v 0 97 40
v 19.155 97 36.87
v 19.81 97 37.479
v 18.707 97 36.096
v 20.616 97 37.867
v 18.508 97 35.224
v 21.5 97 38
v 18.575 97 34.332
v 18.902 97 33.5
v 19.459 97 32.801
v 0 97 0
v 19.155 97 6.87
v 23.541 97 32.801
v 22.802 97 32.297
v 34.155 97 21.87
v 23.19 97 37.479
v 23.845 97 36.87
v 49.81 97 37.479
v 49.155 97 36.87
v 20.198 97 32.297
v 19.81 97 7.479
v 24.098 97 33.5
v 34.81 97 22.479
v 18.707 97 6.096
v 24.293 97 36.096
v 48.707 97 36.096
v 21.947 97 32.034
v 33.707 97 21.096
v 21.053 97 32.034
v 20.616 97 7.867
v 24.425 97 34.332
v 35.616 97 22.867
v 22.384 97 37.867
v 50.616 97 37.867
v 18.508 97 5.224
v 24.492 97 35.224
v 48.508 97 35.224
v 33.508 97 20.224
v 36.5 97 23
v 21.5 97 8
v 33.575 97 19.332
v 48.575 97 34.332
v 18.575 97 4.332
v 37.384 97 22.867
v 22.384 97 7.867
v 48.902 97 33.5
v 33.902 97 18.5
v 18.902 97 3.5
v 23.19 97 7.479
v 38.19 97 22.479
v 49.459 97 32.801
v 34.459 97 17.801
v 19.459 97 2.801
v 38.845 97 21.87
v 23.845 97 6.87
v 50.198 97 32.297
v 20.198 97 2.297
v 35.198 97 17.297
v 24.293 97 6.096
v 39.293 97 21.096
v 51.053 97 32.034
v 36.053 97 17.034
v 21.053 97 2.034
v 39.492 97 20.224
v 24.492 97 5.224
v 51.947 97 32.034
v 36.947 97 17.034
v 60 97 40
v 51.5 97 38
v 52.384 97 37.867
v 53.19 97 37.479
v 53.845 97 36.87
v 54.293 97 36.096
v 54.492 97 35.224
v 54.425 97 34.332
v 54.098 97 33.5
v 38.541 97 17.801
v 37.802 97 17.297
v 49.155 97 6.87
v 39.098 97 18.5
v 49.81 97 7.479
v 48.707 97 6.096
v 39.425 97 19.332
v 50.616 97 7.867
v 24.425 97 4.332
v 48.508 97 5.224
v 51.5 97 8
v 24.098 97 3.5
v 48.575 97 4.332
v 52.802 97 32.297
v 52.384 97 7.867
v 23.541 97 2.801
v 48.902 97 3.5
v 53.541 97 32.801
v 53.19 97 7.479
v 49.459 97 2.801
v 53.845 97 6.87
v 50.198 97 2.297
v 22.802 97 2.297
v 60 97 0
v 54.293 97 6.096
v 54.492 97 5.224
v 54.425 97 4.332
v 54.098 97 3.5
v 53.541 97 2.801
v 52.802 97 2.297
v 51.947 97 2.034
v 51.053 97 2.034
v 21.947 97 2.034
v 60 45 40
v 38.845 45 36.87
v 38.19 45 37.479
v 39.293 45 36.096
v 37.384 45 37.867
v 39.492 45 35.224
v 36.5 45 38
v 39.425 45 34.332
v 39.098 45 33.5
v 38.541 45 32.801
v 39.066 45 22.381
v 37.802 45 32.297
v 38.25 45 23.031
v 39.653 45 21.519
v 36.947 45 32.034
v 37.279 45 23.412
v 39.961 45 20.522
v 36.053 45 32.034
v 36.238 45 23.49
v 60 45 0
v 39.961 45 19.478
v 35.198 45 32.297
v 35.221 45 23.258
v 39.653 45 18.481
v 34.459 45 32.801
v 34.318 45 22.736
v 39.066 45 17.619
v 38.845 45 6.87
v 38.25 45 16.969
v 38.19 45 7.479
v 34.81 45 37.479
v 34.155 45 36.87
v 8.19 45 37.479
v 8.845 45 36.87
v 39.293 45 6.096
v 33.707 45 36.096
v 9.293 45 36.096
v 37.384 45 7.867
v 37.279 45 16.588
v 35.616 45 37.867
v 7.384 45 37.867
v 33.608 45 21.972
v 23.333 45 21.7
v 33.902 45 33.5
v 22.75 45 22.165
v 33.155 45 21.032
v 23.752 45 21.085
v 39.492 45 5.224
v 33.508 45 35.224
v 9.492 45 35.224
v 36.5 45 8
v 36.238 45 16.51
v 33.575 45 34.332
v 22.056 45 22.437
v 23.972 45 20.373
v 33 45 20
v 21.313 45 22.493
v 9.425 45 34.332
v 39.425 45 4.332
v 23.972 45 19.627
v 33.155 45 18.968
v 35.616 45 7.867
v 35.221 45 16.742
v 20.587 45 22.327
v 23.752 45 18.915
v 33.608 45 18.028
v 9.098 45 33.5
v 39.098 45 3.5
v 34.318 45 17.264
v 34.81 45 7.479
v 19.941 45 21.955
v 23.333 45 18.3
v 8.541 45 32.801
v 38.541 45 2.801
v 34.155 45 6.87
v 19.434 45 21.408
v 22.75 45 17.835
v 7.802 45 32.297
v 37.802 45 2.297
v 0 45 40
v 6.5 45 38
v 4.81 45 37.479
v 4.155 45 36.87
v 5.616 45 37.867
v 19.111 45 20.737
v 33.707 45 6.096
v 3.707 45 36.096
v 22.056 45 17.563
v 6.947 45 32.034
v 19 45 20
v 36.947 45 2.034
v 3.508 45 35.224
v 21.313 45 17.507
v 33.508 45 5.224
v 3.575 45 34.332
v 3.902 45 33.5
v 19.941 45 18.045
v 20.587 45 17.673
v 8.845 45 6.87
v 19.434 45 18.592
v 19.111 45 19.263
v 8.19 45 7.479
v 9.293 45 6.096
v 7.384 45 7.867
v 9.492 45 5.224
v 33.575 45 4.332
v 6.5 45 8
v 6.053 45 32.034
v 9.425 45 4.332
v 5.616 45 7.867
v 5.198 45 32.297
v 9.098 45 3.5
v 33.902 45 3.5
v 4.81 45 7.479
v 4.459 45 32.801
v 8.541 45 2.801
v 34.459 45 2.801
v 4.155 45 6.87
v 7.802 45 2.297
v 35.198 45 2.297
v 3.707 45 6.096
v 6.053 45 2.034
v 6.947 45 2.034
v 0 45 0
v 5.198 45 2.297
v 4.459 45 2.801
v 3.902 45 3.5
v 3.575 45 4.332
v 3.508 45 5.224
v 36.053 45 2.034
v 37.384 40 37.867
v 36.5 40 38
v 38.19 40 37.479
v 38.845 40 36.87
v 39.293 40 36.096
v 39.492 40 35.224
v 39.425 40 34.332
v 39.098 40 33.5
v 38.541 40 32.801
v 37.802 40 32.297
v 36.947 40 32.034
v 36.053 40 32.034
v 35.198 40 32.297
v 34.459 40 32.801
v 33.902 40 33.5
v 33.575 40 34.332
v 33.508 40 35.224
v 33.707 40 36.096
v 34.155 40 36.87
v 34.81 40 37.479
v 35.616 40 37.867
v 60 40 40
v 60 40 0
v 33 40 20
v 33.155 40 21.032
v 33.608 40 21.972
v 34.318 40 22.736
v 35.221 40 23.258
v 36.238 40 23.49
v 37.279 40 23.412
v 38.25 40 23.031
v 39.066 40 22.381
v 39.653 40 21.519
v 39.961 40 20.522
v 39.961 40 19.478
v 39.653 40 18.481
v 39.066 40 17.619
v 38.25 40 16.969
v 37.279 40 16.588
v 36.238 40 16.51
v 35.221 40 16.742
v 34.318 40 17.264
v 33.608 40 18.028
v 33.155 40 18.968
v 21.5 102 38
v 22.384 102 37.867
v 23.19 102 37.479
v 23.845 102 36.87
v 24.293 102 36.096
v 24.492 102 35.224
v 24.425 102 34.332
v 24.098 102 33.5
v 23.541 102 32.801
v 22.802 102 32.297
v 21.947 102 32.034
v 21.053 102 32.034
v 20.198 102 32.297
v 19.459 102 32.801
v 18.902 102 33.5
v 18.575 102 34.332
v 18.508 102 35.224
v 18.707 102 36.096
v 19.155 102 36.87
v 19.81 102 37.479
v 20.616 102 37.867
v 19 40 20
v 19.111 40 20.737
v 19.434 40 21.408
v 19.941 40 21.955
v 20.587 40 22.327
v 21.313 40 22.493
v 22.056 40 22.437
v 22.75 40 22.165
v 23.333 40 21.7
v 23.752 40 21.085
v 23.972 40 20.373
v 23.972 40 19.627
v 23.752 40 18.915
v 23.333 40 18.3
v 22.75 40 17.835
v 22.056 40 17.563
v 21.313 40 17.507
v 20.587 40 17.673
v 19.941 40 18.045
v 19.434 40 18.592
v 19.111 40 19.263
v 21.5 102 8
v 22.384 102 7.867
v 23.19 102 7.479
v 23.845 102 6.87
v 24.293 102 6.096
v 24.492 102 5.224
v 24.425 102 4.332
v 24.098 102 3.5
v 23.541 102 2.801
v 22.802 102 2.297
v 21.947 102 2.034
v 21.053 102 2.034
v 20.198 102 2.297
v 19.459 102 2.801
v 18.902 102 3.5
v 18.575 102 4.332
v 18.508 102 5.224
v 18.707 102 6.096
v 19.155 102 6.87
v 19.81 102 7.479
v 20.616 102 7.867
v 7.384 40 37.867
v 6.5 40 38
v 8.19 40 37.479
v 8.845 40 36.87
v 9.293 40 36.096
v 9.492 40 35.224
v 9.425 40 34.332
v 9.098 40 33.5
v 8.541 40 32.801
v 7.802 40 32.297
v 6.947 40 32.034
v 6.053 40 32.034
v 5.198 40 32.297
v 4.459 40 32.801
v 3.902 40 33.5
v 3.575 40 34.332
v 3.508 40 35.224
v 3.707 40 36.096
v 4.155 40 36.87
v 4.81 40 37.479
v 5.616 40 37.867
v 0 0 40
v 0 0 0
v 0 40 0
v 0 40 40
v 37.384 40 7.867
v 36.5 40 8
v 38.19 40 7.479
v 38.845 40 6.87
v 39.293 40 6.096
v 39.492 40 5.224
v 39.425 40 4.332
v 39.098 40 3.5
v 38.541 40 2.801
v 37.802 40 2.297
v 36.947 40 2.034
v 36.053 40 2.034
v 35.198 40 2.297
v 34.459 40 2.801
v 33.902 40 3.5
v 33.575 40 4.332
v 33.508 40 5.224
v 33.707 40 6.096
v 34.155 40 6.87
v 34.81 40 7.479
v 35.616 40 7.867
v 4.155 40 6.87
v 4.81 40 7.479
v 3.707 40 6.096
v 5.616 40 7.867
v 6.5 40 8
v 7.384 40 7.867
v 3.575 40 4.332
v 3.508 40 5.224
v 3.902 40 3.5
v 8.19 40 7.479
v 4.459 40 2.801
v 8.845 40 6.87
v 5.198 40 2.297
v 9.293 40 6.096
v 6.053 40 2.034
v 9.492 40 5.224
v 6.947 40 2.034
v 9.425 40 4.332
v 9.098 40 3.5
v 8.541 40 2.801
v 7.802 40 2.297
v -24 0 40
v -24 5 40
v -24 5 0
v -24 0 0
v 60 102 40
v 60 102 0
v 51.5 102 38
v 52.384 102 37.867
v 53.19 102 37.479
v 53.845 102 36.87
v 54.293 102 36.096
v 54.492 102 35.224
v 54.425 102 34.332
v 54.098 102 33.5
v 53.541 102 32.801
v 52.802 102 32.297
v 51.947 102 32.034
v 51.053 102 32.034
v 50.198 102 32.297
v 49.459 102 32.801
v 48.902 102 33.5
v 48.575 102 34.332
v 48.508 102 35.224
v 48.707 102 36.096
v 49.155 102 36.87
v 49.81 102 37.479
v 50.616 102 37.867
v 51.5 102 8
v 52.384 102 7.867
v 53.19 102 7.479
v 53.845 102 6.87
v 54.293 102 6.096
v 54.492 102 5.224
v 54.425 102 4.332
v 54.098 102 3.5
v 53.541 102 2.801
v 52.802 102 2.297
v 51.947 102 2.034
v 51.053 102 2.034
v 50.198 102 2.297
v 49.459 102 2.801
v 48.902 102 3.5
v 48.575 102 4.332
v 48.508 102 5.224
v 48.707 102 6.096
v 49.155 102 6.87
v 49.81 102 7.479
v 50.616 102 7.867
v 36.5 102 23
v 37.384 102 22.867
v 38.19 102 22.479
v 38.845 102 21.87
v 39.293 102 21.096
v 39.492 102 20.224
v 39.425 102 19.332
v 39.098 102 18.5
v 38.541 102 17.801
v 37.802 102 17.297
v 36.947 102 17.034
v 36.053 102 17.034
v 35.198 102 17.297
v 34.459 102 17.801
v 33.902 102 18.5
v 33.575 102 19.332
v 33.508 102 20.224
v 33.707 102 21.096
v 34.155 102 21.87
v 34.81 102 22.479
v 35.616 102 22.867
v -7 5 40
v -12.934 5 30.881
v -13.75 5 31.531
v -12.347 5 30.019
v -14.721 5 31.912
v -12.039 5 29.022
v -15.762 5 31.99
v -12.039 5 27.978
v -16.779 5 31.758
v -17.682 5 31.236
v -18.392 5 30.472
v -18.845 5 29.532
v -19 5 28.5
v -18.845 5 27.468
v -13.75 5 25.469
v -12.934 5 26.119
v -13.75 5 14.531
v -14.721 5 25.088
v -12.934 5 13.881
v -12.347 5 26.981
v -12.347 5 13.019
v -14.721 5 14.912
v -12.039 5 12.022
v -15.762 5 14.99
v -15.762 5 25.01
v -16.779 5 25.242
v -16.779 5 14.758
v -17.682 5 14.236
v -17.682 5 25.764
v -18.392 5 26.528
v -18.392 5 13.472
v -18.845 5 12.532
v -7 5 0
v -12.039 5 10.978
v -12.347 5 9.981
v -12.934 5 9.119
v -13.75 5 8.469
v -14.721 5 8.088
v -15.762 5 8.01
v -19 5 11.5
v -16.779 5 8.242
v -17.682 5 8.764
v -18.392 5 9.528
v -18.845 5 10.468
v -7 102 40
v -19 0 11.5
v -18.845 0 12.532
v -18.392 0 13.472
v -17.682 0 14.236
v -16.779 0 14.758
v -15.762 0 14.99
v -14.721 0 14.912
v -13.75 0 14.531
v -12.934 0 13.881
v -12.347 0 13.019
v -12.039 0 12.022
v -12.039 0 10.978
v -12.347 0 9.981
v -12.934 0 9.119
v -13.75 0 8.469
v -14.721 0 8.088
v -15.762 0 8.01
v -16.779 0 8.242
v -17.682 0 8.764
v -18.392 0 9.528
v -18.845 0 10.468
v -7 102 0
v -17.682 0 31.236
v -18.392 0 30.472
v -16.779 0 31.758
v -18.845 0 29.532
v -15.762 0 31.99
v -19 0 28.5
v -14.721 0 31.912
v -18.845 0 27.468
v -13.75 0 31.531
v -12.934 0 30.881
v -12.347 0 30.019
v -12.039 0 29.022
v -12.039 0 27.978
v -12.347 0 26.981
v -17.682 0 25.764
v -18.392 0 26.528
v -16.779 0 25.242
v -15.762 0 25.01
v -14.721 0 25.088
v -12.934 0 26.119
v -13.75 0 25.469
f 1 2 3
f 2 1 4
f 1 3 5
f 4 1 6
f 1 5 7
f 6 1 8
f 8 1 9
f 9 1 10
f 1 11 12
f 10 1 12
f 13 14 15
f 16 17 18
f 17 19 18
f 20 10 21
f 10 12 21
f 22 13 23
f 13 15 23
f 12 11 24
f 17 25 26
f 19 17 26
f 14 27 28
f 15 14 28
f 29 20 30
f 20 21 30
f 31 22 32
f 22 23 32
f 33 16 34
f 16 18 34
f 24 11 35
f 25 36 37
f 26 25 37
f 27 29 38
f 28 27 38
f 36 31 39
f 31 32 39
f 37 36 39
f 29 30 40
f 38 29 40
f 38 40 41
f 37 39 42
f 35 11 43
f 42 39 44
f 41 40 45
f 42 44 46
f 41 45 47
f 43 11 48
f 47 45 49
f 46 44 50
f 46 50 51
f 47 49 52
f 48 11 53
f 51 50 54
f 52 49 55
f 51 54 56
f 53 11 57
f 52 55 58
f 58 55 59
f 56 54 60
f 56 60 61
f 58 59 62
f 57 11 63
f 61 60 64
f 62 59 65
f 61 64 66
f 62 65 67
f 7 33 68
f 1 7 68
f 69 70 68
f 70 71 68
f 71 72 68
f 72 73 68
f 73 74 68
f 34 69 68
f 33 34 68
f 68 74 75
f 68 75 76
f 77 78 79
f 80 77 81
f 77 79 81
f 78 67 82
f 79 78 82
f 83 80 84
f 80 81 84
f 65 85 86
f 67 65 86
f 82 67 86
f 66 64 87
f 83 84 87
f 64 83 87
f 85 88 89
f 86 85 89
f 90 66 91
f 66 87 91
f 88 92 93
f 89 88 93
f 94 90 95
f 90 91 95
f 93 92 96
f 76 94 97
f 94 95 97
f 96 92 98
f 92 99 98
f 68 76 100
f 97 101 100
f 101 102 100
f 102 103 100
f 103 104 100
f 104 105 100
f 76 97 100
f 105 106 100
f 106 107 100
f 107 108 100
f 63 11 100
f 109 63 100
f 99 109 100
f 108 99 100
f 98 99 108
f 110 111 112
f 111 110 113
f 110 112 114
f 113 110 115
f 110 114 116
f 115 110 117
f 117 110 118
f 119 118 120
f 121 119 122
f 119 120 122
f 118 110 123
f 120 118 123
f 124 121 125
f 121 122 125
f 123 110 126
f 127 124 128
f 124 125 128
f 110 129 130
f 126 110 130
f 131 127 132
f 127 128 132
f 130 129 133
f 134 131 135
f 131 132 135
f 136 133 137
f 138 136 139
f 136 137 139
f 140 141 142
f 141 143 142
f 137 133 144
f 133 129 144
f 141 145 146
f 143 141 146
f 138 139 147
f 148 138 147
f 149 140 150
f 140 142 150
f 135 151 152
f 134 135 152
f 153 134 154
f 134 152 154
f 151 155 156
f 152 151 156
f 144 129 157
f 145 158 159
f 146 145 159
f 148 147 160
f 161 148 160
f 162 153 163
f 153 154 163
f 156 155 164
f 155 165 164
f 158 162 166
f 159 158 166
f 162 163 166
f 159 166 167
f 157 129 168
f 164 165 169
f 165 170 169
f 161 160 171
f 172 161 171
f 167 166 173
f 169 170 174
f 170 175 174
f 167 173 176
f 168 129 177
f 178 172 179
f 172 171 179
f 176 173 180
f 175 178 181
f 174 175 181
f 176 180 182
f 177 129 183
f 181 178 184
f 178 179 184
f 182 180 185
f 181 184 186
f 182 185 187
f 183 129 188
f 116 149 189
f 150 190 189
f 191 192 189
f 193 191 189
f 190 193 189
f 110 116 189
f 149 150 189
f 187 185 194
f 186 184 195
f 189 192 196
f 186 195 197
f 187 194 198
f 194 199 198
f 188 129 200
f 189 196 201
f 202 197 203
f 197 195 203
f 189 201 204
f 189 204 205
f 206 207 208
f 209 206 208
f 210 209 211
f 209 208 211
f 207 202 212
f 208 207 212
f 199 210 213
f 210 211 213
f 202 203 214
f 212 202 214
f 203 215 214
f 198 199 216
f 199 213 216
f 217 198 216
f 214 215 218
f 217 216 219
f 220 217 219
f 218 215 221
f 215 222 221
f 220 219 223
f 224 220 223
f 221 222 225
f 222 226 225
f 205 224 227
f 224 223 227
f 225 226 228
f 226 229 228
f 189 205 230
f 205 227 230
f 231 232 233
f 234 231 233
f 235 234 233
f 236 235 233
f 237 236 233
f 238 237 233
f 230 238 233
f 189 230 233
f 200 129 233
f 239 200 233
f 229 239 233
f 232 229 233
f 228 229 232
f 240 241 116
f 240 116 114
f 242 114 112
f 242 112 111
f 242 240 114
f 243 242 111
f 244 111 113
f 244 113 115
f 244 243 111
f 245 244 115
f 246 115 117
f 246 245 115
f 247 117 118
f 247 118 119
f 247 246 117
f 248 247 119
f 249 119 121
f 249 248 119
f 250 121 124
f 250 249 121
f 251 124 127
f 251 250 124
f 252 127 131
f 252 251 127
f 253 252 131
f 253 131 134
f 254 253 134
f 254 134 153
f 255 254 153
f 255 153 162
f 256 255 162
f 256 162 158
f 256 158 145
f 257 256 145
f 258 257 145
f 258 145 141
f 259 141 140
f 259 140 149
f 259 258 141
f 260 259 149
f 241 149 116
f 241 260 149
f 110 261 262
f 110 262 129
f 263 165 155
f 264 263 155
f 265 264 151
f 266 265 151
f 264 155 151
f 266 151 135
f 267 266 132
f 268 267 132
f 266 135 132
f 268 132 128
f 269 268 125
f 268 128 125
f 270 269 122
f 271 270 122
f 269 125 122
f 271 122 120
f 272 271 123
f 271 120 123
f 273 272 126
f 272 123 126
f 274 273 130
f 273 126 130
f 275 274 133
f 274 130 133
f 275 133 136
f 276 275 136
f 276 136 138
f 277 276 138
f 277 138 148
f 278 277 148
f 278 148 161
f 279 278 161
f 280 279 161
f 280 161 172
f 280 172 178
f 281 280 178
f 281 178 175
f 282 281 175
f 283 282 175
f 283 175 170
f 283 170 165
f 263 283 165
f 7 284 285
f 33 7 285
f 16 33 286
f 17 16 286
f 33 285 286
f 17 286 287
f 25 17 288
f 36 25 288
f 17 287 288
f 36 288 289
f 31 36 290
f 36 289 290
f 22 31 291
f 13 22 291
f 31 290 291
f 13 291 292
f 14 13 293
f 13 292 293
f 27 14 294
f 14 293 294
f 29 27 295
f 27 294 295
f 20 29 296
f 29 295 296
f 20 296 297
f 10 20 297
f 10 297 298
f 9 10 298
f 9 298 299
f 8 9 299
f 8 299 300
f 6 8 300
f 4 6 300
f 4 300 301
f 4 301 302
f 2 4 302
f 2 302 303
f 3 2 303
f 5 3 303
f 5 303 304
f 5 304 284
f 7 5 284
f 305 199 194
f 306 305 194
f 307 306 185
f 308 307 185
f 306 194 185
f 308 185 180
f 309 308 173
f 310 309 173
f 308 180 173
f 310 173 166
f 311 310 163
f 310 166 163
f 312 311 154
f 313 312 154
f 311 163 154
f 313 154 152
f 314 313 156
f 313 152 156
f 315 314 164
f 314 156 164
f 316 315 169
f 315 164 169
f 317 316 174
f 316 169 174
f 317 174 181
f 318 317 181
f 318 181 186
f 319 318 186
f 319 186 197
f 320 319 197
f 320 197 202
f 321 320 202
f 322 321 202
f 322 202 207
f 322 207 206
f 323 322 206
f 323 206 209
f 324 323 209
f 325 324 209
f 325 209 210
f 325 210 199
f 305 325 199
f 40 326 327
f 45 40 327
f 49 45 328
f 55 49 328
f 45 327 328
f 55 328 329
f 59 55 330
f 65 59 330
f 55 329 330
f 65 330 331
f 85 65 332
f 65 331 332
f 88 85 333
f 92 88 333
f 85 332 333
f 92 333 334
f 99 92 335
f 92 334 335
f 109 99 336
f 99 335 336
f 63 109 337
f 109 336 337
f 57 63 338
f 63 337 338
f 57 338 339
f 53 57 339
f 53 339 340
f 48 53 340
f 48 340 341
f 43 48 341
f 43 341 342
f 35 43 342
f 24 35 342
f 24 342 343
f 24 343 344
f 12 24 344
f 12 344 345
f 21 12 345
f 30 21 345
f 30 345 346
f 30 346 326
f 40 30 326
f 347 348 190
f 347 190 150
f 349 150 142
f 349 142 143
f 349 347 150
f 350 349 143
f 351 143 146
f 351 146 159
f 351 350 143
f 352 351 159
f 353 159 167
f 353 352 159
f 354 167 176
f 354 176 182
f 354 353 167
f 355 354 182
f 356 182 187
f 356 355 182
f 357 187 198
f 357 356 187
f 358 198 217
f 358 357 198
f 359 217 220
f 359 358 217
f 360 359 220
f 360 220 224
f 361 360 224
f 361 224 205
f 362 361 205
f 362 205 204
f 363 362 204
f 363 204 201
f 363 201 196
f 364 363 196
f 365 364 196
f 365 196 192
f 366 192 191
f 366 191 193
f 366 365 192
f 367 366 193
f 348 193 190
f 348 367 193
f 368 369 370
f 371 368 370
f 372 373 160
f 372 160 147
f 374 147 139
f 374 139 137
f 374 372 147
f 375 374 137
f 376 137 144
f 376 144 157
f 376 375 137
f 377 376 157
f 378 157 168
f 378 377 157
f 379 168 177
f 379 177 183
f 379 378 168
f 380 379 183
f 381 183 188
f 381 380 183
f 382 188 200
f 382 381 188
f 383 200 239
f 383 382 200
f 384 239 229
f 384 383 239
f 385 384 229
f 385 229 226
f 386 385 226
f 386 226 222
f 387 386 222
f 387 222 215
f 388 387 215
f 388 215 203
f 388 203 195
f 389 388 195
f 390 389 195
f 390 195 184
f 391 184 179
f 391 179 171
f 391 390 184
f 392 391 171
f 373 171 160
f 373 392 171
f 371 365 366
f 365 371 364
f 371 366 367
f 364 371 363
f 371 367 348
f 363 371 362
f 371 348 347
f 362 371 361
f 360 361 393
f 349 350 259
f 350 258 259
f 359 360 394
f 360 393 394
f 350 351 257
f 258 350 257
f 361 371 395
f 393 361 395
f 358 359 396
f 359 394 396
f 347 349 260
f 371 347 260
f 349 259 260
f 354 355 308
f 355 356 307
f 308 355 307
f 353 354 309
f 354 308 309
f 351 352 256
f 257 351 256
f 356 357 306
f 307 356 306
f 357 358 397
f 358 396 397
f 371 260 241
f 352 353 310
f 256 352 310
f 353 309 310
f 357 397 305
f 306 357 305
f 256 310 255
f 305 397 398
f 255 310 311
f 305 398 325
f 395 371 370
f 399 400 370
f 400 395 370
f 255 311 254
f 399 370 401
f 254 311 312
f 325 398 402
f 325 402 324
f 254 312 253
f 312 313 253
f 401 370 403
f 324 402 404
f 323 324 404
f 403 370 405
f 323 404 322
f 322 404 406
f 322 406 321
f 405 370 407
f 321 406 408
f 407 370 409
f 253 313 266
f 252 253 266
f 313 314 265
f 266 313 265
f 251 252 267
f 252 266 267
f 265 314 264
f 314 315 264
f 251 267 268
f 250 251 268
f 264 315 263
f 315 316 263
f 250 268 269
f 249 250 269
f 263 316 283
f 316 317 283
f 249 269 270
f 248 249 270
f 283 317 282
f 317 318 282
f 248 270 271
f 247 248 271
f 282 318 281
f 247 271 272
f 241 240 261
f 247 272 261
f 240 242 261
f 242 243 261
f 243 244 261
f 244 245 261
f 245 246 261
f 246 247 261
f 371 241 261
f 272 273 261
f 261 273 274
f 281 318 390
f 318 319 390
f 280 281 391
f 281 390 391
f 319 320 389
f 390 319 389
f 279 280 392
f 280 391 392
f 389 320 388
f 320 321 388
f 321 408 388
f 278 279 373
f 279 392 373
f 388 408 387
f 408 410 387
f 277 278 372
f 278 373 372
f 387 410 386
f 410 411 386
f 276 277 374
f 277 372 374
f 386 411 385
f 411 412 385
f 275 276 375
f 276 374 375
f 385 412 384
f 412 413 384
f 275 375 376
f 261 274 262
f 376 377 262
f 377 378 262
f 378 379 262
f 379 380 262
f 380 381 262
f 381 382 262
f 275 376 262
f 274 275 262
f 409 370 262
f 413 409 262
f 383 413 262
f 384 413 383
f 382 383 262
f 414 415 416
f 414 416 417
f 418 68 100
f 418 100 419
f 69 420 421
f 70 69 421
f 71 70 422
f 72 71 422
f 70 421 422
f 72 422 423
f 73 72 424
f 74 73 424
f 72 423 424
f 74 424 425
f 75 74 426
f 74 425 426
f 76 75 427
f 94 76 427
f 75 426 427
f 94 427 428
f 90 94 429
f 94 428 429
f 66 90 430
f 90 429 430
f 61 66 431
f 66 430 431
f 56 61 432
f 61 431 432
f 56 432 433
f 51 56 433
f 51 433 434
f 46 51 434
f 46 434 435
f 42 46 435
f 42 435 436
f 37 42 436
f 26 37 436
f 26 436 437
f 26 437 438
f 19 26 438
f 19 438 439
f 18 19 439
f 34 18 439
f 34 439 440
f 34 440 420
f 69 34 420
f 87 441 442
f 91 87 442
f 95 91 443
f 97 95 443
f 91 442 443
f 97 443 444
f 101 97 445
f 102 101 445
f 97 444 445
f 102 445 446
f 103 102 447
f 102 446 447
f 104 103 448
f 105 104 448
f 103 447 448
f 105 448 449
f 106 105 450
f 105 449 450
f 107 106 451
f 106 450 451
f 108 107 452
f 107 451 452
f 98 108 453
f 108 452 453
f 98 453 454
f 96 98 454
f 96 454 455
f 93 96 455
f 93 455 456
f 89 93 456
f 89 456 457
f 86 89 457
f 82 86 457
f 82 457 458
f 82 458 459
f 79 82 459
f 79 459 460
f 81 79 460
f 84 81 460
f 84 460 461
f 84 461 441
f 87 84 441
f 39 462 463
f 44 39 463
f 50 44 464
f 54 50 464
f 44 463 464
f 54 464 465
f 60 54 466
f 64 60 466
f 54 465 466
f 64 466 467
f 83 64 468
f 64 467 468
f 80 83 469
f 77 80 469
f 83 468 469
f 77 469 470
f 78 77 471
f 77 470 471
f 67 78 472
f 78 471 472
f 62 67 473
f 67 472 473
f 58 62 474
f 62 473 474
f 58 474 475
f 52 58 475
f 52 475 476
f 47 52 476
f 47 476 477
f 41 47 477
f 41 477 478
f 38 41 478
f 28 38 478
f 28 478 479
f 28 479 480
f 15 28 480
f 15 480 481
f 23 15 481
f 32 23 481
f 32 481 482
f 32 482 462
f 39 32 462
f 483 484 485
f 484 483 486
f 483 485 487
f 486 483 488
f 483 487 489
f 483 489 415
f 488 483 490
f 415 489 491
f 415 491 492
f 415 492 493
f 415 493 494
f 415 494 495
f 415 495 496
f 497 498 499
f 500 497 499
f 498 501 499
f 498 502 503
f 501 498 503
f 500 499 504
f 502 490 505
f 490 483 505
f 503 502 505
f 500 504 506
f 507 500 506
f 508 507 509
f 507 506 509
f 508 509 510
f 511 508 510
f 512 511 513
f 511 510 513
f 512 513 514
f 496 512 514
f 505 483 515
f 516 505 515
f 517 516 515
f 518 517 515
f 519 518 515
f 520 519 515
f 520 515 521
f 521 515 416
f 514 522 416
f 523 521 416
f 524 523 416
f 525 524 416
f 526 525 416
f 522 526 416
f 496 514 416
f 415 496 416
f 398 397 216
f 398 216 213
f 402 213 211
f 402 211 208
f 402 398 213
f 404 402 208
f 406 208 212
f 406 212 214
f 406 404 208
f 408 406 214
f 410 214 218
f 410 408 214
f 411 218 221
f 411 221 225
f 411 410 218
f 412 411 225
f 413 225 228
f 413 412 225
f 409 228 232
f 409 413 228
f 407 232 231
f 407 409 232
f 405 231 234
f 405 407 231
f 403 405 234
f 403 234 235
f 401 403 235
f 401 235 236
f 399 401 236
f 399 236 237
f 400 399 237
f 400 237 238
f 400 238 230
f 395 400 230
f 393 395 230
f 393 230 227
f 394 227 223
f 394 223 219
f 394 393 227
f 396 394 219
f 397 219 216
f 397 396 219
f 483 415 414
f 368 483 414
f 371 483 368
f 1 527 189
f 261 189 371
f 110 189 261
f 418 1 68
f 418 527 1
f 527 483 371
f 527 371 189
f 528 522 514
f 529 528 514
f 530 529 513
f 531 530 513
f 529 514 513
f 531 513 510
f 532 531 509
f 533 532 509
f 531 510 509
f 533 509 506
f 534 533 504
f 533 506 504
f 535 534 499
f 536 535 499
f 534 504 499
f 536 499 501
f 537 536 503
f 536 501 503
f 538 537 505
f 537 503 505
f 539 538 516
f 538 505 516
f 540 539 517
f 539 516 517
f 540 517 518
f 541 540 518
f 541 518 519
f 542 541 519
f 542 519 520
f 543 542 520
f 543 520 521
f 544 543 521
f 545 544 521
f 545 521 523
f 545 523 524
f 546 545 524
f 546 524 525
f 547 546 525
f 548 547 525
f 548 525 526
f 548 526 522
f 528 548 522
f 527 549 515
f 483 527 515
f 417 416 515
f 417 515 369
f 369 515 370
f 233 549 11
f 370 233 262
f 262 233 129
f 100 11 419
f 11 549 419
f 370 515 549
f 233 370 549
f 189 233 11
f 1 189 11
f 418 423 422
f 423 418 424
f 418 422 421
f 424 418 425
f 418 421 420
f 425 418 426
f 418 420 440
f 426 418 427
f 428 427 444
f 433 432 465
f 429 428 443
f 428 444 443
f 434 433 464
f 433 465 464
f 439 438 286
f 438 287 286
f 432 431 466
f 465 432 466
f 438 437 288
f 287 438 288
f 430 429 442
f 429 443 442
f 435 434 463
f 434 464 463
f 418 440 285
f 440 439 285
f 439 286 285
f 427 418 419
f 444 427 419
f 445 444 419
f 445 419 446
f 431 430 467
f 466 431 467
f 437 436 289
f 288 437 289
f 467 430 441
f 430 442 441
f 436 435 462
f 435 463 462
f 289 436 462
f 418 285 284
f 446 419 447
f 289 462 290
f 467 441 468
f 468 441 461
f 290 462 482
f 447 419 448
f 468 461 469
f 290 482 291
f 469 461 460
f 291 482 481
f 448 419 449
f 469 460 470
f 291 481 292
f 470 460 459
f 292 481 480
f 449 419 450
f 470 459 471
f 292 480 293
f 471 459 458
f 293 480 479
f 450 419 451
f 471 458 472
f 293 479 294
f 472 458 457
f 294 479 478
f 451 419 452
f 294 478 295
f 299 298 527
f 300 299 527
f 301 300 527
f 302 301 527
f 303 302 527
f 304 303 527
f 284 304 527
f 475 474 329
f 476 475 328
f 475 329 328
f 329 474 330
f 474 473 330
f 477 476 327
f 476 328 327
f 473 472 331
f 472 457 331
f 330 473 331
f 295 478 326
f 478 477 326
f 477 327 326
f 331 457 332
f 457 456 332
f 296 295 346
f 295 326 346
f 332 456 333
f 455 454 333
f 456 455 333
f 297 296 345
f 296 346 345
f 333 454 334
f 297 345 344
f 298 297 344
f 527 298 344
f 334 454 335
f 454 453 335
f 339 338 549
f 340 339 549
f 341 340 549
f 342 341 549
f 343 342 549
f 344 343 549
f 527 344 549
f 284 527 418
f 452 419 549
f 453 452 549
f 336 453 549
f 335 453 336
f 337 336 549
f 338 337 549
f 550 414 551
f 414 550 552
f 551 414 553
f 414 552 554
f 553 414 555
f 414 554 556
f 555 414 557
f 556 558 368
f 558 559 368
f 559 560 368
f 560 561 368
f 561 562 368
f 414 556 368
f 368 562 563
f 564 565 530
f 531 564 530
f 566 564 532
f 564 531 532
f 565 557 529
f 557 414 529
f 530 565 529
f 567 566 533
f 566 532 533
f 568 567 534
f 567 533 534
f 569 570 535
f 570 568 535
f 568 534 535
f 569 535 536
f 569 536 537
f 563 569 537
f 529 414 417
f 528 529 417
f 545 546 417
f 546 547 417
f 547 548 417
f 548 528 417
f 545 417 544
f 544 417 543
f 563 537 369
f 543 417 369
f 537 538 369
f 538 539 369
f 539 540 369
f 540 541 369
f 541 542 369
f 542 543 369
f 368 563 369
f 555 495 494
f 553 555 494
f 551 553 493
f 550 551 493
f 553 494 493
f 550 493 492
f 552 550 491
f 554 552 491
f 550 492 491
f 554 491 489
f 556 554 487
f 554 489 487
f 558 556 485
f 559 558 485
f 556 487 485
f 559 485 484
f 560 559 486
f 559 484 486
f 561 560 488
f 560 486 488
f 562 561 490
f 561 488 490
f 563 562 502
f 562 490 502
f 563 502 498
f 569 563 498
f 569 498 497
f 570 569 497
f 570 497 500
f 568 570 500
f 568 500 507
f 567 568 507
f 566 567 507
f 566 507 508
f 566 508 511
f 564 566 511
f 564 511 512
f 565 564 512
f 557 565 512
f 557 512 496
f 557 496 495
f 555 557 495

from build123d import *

# Parameters (mm, degrees)
SALIENTE_EXTRUIR1_DEPTH = 40
CORTAR_EXTRUIR1_REACH   = 122.868
CROQUIS2_R              = 3.5
CORTAR_EXTRUIR4_START   = -62
CROQUIS3_R              = 3
CORTAR_EXTRUIR4_DEPTH   = 5
CORTAR_EXTRUIR3_REACH   = 93.918
CROQUIS4_R              = 2.5
CROQUIS4_R_2            = 3.5
CORTAR_EXTRUIR5_REACH   = 126.916
CROQUIS5_R              = 3


with BuildPart() as part:
    # Croquis1 → Saliente-Extruir1 (new body)
    with BuildSketch(Plane.XY):
        Polygon((0, 0), (0, 40), (60, 40), (60, 45), (0, 45), (0, 97), (60, 97), (60, 102), (-7, 102), (-7, 5), (-24, 5), (-24, 0), align=None)
    extrude(amount=SALIENTE_EXTRUIR1_DEPTH)

    # Croquis2 → Cortar-Extruir1 (cut, up to next)
    with BuildSketch(Plane(origin=(0, 5, 0), x_dir=(1, 0, 0), z_dir=(0, 1, 0)), mode=Mode.PRIVATE) as cortar_extruir1_sk1:
        with Locations(Location((-15.5, -11.5, 0), (0, 0, 180))):
            Circle(CROQUIS2_R)
    cortar_extruir1_tool1 = extrude(cortar_extruir1_sk1.sketch, amount=-CORTAR_EXTRUIR1_REACH, mode=Mode.PRIVATE) & part.part
    # Croquis2 → Cortar-Extruir1 (cut, up to next)
    with BuildSketch(Plane(origin=(0, 5, 0), x_dir=(1, 0, 0), z_dir=(0, 1, 0)), mode=Mode.PRIVATE) as cortar_extruir1_sk2:
        with Locations(Location((-15.5, -28.5, 0), (0, 0, 180))):
            Circle(CROQUIS2_R)
    cortar_extruir1_tool2 = extrude(cortar_extruir1_sk2.sketch, amount=-CORTAR_EXTRUIR1_REACH, mode=Mode.PRIVATE) & part.part
    add(cortar_extruir1_tool1.solids().sort_by_distance((-15.5, 5, 11.5))[0], mode=Mode.SUBTRACT)
    add(cortar_extruir1_tool2.solids().sort_by_distance((-15.5, 5, 28.5))[0], mode=Mode.SUBTRACT)

    # Croquis3 → Cortar-Extruir4 (cut)
    with BuildSketch(Plane(origin=(0, 102, 0), x_dir=(1, 0, 0), z_dir=(0, 1, 0)).offset(CORTAR_EXTRUIR4_START)):
        with Locations(Location((6.5, -5, 0), (0, 0, 270))):
            Circle(CROQUIS3_R)
        with Locations(Location((36.5, -5, 0), (0, 0, 270))):
            Circle(CROQUIS3_R)
        with Locations(Location((6.5, -35, 0), (0, 0, 270))):
            Circle(CROQUIS3_R)
        with Locations(Location((36.5, -35, 0), (0, 0, 270))):
            Circle(CROQUIS3_R)
    extrude(amount=CORTAR_EXTRUIR4_DEPTH, mode=Mode.SUBTRACT)

    # Croquis4 → Cortar-Extruir3 (cut, up to next)
    with BuildSketch(Plane(origin=(0, 45, 0), x_dir=(1, 0, 0), z_dir=(0, 1, 0)), mode=Mode.PRIVATE) as cortar_extruir3_sk1:
        with Locations(Location((21.5, -20, 0), (0, 0, 180))):
            Circle(CROQUIS4_R)
    cortar_extruir3_tool1 = extrude(cortar_extruir3_sk1.sketch, amount=-CORTAR_EXTRUIR3_REACH, mode=Mode.PRIVATE) & part.part
    # Croquis4 → Cortar-Extruir3 (cut, up to next)
    with BuildSketch(Plane(origin=(0, 45, 0), x_dir=(1, 0, 0), z_dir=(0, 1, 0)), mode=Mode.PRIVATE) as cortar_extruir3_sk2:
        with Locations(Location((36.5, -20, 0), (0, 0, 180))):
            Circle(CROQUIS4_R_2)
    cortar_extruir3_tool2 = extrude(cortar_extruir3_sk2.sketch, amount=-CORTAR_EXTRUIR3_REACH, mode=Mode.PRIVATE) & part.part
    add(cortar_extruir3_tool1.solids().sort_by_distance((21.5, 45, 20))[0], mode=Mode.SUBTRACT)
    add(cortar_extruir3_tool2.solids().sort_by_distance((36.5, 45, 20))[0], mode=Mode.SUBTRACT)

    # Croquis5 → Cortar-Extruir5 (cut, up to next)
    with BuildSketch(Plane(origin=(0, 102, 0), x_dir=(1, 0, 0), z_dir=(0, 1, 0)), mode=Mode.PRIVATE) as cortar_extruir5_sk1:
        with Locations(Location((21.5, -5, 0), (0, 0, 270))):
            Circle(CROQUIS5_R)
    cortar_extruir5_tool1 = extrude(cortar_extruir5_sk1.sketch, amount=-CORTAR_EXTRUIR5_REACH, mode=Mode.PRIVATE) & part.part
    # Croquis5 → Cortar-Extruir5 (cut, up to next)
    with BuildSketch(Plane(origin=(0, 102, 0), x_dir=(1, 0, 0), z_dir=(0, 1, 0)), mode=Mode.PRIVATE) as cortar_extruir5_sk2:
        with Locations(Location((51.5, -5, 0), (0, 0, 270))):
            Circle(CROQUIS5_R)
    cortar_extruir5_tool2 = extrude(cortar_extruir5_sk2.sketch, amount=-CORTAR_EXTRUIR5_REACH, mode=Mode.PRIVATE) & part.part
    # Croquis5 → Cortar-Extruir5 (cut, up to next)
    with BuildSketch(Plane(origin=(0, 102, 0), x_dir=(1, 0, 0), z_dir=(0, 1, 0)), mode=Mode.PRIVATE) as cortar_extruir5_sk3:
        with Locations(Location((21.5, -35, 0), (0, 0, 270))):
            Circle(CROQUIS5_R)
    cortar_extruir5_tool3 = extrude(cortar_extruir5_sk3.sketch, amount=-CORTAR_EXTRUIR5_REACH, mode=Mode.PRIVATE) & part.part
    # Croquis5 → Cortar-Extruir5 (cut, up to next)
    with BuildSketch(Plane(origin=(0, 102, 0), x_dir=(1, 0, 0), z_dir=(0, 1, 0)), mode=Mode.PRIVATE) as cortar_extruir5_sk4:
        with Locations(Location((51.5, -35, 0), (0, 0, 270))):
            Circle(CROQUIS5_R)
    cortar_extruir5_tool4 = extrude(cortar_extruir5_sk4.sketch, amount=-CORTAR_EXTRUIR5_REACH, mode=Mode.PRIVATE) & part.part
    # Croquis5 → Cortar-Extruir5 (cut, up to next)
    with BuildSketch(Plane(origin=(0, 102, 0), x_dir=(1, 0, 0), z_dir=(0, 1, 0)), mode=Mode.PRIVATE) as cortar_extruir5_sk5:
        with Locations(Location((36.5, -20, 0), (0, 0, 270))):
            Circle(CROQUIS5_R)
    cortar_extruir5_tool5 = extrude(cortar_extruir5_sk5.sketch, amount=-CORTAR_EXTRUIR5_REACH, mode=Mode.PRIVATE) & part.part
    add(cortar_extruir5_tool1.solids().sort_by_distance((21.5, 102, 5))[0], mode=Mode.SUBTRACT)
    add(cortar_extruir5_tool2.solids().sort_by_distance((51.5, 102, 5))[0], mode=Mode.SUBTRACT)
    add(cortar_extruir5_tool3.solids().sort_by_distance((21.5, 102, 35))[0], mode=Mode.SUBTRACT)
    add(cortar_extruir5_tool4.solids().sort_by_distance((51.5, 102, 35))[0], mode=Mode.SUBTRACT)
    add(cortar_extruir5_tool5.solids().sort_by_distance((36.5, 102, 20))[0], mode=Mode.SUBTRACT)


solid = part.part
